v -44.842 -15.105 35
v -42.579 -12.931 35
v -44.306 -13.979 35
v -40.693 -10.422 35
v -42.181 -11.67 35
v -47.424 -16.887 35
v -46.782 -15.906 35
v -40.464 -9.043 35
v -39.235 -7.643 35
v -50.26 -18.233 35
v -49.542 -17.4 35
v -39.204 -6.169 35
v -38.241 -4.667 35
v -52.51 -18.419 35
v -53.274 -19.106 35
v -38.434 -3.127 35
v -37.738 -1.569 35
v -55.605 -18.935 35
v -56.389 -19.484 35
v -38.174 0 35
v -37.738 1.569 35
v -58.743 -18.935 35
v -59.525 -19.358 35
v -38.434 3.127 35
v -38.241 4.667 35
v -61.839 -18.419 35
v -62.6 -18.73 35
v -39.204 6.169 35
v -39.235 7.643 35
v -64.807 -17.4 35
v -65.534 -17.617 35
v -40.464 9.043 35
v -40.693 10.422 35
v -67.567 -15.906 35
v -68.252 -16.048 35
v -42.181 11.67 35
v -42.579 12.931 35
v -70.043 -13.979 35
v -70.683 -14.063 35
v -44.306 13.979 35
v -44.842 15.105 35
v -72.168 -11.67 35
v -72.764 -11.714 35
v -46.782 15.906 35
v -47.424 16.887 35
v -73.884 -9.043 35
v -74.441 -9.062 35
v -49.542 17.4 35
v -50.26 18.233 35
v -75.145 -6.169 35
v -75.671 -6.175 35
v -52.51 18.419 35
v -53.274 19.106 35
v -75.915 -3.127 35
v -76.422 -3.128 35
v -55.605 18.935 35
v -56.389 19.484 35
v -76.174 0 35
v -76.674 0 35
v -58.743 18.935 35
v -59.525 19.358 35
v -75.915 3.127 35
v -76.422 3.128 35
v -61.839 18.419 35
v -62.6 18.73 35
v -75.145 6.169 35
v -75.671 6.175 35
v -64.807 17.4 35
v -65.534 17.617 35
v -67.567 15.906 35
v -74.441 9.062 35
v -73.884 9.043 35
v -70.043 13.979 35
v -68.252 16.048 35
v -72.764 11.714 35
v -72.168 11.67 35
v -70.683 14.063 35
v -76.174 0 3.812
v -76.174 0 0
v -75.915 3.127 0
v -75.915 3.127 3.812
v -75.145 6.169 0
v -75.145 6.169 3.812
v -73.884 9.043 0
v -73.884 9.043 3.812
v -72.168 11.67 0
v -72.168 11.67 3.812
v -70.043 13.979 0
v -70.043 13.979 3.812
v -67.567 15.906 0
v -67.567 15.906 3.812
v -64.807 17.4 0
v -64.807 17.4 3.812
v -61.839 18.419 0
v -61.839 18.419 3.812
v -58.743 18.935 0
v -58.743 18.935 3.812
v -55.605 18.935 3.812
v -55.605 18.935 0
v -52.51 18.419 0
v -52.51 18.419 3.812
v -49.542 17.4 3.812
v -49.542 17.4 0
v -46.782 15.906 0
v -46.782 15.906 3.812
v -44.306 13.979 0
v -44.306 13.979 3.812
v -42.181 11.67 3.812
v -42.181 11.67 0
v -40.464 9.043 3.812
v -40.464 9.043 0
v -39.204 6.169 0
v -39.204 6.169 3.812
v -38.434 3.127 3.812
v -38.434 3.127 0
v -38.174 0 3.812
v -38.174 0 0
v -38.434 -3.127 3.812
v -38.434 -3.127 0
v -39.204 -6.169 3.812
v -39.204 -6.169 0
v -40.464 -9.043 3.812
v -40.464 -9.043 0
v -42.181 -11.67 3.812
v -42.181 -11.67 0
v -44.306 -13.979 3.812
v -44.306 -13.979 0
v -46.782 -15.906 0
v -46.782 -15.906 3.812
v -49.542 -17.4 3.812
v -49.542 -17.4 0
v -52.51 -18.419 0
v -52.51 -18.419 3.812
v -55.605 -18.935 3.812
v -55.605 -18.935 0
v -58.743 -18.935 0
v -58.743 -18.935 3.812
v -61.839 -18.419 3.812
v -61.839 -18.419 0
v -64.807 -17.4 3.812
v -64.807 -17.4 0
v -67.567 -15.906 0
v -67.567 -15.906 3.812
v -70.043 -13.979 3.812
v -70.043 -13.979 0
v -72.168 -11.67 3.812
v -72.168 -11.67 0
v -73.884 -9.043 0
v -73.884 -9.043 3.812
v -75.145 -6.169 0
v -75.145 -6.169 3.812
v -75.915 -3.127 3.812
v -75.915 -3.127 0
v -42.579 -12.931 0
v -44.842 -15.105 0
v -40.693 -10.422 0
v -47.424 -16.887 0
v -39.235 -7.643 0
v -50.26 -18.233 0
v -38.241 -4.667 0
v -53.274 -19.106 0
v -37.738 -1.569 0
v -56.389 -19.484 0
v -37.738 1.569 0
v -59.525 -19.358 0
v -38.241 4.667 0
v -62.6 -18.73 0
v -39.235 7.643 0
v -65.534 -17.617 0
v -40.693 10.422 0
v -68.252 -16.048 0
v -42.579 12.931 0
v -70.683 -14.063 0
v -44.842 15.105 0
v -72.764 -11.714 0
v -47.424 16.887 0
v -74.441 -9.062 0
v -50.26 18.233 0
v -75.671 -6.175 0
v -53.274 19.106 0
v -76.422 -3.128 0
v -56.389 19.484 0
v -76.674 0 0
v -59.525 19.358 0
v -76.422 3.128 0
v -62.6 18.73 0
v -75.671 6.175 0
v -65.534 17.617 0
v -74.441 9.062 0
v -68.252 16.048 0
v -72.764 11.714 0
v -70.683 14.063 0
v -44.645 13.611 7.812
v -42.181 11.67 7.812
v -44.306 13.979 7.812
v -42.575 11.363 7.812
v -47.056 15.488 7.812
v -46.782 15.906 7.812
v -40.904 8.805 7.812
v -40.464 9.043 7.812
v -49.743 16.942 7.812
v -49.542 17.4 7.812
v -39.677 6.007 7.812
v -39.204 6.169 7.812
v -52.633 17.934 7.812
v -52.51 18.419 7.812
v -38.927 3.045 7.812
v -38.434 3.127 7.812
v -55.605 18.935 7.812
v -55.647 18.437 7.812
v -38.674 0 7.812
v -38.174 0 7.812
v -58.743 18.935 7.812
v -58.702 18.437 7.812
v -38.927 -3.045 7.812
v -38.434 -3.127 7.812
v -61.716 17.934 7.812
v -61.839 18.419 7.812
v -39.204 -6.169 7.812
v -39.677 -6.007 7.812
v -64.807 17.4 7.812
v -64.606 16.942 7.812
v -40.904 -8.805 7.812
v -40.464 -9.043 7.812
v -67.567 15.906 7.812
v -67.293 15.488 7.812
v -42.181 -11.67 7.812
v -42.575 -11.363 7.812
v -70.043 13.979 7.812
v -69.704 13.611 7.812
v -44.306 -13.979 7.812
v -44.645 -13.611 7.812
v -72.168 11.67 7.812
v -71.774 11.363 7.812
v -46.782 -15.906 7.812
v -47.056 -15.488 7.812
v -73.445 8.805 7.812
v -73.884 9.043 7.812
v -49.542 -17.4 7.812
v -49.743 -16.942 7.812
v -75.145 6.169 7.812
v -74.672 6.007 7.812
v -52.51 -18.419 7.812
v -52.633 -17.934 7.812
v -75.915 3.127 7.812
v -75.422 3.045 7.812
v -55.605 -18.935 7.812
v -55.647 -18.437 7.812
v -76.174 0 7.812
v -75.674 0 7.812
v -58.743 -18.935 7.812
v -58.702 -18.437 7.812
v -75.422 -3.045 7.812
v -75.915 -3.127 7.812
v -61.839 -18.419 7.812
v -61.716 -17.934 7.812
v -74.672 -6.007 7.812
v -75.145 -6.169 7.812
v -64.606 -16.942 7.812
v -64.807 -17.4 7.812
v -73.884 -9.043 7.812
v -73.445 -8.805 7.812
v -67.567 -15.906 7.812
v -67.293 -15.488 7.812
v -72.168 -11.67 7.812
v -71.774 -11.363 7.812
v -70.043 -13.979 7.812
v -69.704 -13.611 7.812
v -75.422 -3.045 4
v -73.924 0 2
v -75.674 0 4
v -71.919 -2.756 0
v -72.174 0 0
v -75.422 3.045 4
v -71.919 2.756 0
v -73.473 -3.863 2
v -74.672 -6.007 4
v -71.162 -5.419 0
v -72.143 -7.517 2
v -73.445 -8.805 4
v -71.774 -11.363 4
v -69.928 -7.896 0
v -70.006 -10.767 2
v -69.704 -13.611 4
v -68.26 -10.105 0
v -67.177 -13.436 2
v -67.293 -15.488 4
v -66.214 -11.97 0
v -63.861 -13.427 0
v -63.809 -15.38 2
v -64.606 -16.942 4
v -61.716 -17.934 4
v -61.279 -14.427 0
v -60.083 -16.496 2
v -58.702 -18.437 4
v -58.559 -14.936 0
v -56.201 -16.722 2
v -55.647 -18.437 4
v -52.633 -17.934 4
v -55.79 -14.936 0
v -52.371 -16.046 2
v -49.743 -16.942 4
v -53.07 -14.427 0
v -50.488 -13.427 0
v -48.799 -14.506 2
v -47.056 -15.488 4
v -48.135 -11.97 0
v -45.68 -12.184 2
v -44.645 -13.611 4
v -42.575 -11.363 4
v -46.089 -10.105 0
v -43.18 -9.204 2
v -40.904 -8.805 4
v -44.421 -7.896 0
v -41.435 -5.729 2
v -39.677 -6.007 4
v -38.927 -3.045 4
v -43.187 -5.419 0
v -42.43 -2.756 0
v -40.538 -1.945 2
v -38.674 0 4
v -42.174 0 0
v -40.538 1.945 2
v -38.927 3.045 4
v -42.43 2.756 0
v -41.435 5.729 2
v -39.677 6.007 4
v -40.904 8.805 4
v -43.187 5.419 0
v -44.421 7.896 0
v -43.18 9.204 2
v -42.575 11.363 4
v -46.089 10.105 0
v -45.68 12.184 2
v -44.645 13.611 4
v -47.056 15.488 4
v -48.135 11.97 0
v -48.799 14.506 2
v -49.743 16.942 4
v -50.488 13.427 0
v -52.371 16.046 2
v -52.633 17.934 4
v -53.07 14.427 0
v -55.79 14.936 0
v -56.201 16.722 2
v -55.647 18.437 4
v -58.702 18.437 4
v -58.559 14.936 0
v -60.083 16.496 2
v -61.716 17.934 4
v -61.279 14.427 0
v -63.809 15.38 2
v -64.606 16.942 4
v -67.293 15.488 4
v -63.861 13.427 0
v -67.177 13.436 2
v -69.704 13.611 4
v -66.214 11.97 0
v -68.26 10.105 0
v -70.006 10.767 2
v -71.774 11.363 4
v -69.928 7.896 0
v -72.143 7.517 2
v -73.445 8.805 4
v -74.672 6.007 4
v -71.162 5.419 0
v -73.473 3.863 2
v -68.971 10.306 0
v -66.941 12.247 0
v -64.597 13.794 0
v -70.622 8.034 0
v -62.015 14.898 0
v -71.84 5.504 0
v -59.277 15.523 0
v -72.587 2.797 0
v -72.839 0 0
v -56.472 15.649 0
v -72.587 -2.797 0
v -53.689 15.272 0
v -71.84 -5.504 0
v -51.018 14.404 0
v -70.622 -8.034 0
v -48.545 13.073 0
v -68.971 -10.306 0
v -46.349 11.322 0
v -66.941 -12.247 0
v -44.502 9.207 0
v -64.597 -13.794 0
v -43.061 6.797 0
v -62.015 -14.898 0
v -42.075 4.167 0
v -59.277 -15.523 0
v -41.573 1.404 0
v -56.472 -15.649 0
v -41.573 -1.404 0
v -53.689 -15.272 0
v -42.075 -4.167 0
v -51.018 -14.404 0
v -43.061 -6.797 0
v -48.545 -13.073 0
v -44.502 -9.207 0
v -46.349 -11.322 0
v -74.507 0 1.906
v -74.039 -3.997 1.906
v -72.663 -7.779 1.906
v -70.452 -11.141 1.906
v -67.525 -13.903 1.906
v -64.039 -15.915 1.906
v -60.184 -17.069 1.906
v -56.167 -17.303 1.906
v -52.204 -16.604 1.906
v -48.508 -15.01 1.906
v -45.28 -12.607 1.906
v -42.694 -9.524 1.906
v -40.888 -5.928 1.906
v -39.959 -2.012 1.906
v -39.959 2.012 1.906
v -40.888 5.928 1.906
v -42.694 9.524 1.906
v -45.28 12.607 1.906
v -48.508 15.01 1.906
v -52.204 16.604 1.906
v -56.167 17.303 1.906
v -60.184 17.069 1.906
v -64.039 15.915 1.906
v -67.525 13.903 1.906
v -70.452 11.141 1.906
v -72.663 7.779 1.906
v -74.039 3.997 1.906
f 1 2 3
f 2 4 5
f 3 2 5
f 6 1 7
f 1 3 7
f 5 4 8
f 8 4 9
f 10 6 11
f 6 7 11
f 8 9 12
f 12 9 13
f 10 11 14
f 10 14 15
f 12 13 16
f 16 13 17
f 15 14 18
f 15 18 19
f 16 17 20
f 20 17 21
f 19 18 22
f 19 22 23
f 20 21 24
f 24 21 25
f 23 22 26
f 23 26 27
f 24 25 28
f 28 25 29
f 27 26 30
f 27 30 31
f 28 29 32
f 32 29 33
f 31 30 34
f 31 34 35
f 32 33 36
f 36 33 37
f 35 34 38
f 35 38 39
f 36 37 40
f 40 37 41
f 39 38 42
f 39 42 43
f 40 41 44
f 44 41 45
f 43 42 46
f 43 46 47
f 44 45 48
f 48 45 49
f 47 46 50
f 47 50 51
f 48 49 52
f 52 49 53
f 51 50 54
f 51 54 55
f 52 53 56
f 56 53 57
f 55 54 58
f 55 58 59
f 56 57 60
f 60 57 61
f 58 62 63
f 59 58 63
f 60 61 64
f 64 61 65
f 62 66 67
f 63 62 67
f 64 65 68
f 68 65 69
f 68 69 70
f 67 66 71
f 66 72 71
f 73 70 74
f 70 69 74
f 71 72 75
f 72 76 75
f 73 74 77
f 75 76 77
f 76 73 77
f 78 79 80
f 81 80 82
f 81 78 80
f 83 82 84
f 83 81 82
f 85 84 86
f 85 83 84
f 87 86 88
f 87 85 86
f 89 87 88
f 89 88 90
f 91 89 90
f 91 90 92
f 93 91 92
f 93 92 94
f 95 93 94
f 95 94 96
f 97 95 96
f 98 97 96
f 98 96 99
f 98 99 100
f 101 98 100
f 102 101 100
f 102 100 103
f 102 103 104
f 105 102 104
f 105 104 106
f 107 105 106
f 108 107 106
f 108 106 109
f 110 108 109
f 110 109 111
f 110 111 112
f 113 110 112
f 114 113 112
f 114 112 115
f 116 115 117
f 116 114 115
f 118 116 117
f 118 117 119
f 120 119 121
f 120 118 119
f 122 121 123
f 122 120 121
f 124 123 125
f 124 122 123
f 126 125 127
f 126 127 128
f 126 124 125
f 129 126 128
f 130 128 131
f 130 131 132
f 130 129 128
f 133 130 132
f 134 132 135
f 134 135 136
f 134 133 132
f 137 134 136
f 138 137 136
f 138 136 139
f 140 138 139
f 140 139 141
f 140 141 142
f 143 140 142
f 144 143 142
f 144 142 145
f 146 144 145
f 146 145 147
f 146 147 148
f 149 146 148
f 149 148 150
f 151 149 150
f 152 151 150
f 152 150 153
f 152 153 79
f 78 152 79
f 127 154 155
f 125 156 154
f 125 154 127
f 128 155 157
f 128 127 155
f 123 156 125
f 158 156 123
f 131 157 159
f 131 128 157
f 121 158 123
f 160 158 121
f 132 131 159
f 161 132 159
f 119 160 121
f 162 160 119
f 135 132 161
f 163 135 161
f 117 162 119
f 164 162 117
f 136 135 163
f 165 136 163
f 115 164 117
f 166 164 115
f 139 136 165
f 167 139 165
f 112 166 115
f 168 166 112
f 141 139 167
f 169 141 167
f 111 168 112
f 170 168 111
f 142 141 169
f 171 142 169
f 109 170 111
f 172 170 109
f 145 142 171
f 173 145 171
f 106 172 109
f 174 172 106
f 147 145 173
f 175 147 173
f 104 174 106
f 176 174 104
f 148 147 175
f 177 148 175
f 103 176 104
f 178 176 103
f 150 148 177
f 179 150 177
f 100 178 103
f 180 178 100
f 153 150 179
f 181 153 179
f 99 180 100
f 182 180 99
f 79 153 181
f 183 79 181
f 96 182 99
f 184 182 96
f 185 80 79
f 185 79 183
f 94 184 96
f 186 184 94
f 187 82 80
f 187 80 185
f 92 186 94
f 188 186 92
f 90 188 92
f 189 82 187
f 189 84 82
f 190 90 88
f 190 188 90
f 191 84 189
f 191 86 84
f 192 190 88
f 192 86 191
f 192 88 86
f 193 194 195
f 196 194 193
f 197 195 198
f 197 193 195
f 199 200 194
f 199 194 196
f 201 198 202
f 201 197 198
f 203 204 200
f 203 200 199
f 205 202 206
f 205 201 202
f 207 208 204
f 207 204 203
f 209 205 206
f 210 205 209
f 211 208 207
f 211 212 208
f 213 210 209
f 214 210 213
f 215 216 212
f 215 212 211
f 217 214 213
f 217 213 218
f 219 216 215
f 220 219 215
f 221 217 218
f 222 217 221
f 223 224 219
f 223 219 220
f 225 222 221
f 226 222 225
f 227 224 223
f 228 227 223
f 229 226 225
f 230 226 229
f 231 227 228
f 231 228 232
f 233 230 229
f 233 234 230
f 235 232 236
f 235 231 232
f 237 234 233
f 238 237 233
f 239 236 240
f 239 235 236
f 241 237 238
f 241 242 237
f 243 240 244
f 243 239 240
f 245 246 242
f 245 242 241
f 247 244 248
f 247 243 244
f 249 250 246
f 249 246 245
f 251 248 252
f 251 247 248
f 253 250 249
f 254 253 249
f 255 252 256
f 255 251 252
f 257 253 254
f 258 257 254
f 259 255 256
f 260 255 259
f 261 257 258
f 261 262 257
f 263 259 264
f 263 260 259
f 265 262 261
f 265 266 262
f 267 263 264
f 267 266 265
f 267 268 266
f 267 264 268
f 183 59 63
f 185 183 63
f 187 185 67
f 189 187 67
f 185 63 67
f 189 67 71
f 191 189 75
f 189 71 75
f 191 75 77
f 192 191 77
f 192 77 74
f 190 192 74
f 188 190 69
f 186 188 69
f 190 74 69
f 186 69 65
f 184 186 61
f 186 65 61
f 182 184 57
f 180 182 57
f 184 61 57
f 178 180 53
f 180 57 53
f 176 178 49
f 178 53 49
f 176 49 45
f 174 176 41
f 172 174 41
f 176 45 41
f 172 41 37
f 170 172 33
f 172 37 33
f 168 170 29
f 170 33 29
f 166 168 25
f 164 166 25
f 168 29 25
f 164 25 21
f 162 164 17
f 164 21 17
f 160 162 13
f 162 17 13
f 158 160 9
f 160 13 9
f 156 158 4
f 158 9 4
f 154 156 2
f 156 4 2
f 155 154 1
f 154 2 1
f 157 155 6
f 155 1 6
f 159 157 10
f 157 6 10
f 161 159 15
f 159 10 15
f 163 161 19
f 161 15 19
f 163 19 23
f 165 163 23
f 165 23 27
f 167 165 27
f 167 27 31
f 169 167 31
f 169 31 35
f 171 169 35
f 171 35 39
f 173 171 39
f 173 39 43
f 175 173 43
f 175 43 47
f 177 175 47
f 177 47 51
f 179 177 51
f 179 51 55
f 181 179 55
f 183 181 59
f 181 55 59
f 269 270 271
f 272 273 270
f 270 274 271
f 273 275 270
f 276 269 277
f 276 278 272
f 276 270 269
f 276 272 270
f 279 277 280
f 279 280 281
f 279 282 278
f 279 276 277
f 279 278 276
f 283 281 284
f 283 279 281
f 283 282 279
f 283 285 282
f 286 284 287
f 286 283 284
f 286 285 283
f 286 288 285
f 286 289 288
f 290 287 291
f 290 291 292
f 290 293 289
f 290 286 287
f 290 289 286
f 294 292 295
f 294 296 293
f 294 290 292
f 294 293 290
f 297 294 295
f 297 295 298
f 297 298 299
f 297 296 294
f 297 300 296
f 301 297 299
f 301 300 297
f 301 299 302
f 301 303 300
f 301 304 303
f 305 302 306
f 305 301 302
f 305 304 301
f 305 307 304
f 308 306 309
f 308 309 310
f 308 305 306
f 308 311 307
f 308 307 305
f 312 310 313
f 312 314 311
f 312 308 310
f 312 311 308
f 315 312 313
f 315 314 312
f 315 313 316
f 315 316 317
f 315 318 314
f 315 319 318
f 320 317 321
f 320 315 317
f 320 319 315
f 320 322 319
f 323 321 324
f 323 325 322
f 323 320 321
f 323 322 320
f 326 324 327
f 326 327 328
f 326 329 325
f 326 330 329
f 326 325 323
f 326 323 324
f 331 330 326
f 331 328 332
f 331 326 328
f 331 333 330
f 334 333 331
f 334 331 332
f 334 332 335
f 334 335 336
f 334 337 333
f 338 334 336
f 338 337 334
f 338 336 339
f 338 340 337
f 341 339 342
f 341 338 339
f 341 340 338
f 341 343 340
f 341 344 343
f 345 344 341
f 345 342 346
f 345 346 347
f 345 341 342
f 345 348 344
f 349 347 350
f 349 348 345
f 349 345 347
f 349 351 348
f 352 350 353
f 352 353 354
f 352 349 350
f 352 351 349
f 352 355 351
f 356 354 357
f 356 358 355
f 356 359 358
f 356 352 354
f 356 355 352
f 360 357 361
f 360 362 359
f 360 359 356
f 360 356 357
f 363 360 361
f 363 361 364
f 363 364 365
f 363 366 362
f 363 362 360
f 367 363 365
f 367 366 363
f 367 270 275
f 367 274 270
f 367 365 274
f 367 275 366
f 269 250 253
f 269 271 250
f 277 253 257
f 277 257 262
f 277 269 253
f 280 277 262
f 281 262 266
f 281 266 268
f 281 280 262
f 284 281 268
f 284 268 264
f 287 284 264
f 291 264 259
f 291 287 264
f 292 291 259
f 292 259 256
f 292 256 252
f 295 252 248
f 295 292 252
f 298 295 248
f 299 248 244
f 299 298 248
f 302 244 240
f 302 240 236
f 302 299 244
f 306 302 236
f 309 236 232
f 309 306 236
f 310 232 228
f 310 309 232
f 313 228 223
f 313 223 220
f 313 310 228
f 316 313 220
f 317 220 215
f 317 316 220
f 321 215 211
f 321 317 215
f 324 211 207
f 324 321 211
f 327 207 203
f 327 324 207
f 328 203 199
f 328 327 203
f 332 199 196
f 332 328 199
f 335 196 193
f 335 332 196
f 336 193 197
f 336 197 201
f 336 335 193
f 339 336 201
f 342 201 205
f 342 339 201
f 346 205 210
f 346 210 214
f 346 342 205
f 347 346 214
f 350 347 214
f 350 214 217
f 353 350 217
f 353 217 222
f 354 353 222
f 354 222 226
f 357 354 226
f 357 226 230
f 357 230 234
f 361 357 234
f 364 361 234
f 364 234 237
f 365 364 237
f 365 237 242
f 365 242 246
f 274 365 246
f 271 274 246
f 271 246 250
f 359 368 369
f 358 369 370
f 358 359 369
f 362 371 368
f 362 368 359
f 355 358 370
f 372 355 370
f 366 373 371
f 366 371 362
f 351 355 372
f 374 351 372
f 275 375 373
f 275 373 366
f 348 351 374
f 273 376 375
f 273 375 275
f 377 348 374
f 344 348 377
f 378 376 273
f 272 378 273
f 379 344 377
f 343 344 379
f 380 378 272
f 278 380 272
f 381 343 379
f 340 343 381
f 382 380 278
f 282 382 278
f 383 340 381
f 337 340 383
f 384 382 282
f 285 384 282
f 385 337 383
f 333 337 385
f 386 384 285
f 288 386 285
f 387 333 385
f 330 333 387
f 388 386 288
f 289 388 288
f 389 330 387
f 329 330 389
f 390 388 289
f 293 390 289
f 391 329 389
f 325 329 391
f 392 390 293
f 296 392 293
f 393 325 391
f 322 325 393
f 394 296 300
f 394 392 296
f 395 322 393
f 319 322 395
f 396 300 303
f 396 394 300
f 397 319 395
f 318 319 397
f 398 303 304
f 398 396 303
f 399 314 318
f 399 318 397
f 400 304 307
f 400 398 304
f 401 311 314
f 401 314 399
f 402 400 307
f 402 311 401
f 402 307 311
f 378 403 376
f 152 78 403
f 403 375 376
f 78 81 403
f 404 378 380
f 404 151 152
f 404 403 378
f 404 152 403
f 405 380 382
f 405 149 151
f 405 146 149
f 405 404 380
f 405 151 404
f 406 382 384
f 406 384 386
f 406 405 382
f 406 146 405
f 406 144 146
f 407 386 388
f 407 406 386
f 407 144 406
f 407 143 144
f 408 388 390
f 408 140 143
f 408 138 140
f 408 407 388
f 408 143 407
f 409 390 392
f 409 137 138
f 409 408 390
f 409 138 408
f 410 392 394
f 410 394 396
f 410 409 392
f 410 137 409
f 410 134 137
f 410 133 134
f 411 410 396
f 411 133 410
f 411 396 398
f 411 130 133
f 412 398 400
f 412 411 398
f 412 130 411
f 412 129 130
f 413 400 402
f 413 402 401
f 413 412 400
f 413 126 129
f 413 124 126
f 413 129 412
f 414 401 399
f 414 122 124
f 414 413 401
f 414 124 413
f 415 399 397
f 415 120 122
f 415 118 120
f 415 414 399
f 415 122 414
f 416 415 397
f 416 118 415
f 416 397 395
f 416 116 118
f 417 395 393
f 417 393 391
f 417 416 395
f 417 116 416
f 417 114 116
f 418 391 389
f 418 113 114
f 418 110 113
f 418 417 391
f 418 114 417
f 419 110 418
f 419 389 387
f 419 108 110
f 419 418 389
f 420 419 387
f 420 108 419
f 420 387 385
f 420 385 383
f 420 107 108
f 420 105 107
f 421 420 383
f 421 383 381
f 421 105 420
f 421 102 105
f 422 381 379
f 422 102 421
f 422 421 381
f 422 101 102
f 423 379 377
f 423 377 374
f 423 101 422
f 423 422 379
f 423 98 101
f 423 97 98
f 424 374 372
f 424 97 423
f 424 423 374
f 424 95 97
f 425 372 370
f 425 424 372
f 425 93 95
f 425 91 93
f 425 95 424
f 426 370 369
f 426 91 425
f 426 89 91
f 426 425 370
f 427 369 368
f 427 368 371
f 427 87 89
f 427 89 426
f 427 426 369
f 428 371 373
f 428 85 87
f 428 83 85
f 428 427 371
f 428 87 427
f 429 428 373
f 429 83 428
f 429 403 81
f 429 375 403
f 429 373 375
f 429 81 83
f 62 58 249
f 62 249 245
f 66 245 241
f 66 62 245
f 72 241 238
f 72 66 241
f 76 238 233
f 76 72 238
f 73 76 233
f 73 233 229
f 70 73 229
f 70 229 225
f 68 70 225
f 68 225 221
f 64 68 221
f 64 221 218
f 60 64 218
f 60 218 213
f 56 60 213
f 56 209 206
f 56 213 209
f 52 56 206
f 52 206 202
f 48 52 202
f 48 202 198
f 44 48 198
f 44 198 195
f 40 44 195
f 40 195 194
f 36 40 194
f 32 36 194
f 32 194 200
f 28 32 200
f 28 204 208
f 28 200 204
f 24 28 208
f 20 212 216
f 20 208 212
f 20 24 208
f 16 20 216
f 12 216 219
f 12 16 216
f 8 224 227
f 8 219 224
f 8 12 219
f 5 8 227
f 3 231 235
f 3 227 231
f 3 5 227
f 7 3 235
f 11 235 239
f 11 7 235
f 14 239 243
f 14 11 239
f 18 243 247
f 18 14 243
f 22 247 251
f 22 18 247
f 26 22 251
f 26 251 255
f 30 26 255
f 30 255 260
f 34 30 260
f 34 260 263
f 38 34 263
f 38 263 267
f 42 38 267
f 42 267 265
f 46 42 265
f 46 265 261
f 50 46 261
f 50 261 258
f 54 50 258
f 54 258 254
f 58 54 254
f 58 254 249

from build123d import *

# Parameters (mm, degrees)
EXTRUDE1_START = -35
SKETCH2_R      = 19.5
SKETCH2_R_2    = 19
EXTRUDE1_DEPTH = 35


with BuildPart() as part:
    # Sketch1 → Revolve1 (revolve)
    with BuildSketch(Plane(origin=(0, 0, 0), x_dir=(1, 0, 0), z_dir=(0, 1, 0))):
        Polygon((-72.838876034, 0), (-76.174491921, -3.812132442), (-76.174491921, -7.812132442), (-75.674491921, -7.812132442), (-75.674491921, -4), (-72.174491921, 0), align=None)
    revolve(axis=Axis((-57.174491921, 0, 0), (0, 0, 1)))

    # Sketch2 → Extrude1 (add)
    with BuildSketch(Plane(origin=(0, 0, 0), x_dir=(-1, 0, 0), z_dir=(0, 0, -1)).offset(EXTRUDE1_START)):
        with Locations((57.174491921, 0)):
            Circle(SKETCH2_R)
        with Locations((57.174491921, 0)):
            Circle(SKETCH2_R_2, mode=Mode.SUBTRACT)
    extrude(amount=EXTRUDE1_DEPTH)


solid = part.part
